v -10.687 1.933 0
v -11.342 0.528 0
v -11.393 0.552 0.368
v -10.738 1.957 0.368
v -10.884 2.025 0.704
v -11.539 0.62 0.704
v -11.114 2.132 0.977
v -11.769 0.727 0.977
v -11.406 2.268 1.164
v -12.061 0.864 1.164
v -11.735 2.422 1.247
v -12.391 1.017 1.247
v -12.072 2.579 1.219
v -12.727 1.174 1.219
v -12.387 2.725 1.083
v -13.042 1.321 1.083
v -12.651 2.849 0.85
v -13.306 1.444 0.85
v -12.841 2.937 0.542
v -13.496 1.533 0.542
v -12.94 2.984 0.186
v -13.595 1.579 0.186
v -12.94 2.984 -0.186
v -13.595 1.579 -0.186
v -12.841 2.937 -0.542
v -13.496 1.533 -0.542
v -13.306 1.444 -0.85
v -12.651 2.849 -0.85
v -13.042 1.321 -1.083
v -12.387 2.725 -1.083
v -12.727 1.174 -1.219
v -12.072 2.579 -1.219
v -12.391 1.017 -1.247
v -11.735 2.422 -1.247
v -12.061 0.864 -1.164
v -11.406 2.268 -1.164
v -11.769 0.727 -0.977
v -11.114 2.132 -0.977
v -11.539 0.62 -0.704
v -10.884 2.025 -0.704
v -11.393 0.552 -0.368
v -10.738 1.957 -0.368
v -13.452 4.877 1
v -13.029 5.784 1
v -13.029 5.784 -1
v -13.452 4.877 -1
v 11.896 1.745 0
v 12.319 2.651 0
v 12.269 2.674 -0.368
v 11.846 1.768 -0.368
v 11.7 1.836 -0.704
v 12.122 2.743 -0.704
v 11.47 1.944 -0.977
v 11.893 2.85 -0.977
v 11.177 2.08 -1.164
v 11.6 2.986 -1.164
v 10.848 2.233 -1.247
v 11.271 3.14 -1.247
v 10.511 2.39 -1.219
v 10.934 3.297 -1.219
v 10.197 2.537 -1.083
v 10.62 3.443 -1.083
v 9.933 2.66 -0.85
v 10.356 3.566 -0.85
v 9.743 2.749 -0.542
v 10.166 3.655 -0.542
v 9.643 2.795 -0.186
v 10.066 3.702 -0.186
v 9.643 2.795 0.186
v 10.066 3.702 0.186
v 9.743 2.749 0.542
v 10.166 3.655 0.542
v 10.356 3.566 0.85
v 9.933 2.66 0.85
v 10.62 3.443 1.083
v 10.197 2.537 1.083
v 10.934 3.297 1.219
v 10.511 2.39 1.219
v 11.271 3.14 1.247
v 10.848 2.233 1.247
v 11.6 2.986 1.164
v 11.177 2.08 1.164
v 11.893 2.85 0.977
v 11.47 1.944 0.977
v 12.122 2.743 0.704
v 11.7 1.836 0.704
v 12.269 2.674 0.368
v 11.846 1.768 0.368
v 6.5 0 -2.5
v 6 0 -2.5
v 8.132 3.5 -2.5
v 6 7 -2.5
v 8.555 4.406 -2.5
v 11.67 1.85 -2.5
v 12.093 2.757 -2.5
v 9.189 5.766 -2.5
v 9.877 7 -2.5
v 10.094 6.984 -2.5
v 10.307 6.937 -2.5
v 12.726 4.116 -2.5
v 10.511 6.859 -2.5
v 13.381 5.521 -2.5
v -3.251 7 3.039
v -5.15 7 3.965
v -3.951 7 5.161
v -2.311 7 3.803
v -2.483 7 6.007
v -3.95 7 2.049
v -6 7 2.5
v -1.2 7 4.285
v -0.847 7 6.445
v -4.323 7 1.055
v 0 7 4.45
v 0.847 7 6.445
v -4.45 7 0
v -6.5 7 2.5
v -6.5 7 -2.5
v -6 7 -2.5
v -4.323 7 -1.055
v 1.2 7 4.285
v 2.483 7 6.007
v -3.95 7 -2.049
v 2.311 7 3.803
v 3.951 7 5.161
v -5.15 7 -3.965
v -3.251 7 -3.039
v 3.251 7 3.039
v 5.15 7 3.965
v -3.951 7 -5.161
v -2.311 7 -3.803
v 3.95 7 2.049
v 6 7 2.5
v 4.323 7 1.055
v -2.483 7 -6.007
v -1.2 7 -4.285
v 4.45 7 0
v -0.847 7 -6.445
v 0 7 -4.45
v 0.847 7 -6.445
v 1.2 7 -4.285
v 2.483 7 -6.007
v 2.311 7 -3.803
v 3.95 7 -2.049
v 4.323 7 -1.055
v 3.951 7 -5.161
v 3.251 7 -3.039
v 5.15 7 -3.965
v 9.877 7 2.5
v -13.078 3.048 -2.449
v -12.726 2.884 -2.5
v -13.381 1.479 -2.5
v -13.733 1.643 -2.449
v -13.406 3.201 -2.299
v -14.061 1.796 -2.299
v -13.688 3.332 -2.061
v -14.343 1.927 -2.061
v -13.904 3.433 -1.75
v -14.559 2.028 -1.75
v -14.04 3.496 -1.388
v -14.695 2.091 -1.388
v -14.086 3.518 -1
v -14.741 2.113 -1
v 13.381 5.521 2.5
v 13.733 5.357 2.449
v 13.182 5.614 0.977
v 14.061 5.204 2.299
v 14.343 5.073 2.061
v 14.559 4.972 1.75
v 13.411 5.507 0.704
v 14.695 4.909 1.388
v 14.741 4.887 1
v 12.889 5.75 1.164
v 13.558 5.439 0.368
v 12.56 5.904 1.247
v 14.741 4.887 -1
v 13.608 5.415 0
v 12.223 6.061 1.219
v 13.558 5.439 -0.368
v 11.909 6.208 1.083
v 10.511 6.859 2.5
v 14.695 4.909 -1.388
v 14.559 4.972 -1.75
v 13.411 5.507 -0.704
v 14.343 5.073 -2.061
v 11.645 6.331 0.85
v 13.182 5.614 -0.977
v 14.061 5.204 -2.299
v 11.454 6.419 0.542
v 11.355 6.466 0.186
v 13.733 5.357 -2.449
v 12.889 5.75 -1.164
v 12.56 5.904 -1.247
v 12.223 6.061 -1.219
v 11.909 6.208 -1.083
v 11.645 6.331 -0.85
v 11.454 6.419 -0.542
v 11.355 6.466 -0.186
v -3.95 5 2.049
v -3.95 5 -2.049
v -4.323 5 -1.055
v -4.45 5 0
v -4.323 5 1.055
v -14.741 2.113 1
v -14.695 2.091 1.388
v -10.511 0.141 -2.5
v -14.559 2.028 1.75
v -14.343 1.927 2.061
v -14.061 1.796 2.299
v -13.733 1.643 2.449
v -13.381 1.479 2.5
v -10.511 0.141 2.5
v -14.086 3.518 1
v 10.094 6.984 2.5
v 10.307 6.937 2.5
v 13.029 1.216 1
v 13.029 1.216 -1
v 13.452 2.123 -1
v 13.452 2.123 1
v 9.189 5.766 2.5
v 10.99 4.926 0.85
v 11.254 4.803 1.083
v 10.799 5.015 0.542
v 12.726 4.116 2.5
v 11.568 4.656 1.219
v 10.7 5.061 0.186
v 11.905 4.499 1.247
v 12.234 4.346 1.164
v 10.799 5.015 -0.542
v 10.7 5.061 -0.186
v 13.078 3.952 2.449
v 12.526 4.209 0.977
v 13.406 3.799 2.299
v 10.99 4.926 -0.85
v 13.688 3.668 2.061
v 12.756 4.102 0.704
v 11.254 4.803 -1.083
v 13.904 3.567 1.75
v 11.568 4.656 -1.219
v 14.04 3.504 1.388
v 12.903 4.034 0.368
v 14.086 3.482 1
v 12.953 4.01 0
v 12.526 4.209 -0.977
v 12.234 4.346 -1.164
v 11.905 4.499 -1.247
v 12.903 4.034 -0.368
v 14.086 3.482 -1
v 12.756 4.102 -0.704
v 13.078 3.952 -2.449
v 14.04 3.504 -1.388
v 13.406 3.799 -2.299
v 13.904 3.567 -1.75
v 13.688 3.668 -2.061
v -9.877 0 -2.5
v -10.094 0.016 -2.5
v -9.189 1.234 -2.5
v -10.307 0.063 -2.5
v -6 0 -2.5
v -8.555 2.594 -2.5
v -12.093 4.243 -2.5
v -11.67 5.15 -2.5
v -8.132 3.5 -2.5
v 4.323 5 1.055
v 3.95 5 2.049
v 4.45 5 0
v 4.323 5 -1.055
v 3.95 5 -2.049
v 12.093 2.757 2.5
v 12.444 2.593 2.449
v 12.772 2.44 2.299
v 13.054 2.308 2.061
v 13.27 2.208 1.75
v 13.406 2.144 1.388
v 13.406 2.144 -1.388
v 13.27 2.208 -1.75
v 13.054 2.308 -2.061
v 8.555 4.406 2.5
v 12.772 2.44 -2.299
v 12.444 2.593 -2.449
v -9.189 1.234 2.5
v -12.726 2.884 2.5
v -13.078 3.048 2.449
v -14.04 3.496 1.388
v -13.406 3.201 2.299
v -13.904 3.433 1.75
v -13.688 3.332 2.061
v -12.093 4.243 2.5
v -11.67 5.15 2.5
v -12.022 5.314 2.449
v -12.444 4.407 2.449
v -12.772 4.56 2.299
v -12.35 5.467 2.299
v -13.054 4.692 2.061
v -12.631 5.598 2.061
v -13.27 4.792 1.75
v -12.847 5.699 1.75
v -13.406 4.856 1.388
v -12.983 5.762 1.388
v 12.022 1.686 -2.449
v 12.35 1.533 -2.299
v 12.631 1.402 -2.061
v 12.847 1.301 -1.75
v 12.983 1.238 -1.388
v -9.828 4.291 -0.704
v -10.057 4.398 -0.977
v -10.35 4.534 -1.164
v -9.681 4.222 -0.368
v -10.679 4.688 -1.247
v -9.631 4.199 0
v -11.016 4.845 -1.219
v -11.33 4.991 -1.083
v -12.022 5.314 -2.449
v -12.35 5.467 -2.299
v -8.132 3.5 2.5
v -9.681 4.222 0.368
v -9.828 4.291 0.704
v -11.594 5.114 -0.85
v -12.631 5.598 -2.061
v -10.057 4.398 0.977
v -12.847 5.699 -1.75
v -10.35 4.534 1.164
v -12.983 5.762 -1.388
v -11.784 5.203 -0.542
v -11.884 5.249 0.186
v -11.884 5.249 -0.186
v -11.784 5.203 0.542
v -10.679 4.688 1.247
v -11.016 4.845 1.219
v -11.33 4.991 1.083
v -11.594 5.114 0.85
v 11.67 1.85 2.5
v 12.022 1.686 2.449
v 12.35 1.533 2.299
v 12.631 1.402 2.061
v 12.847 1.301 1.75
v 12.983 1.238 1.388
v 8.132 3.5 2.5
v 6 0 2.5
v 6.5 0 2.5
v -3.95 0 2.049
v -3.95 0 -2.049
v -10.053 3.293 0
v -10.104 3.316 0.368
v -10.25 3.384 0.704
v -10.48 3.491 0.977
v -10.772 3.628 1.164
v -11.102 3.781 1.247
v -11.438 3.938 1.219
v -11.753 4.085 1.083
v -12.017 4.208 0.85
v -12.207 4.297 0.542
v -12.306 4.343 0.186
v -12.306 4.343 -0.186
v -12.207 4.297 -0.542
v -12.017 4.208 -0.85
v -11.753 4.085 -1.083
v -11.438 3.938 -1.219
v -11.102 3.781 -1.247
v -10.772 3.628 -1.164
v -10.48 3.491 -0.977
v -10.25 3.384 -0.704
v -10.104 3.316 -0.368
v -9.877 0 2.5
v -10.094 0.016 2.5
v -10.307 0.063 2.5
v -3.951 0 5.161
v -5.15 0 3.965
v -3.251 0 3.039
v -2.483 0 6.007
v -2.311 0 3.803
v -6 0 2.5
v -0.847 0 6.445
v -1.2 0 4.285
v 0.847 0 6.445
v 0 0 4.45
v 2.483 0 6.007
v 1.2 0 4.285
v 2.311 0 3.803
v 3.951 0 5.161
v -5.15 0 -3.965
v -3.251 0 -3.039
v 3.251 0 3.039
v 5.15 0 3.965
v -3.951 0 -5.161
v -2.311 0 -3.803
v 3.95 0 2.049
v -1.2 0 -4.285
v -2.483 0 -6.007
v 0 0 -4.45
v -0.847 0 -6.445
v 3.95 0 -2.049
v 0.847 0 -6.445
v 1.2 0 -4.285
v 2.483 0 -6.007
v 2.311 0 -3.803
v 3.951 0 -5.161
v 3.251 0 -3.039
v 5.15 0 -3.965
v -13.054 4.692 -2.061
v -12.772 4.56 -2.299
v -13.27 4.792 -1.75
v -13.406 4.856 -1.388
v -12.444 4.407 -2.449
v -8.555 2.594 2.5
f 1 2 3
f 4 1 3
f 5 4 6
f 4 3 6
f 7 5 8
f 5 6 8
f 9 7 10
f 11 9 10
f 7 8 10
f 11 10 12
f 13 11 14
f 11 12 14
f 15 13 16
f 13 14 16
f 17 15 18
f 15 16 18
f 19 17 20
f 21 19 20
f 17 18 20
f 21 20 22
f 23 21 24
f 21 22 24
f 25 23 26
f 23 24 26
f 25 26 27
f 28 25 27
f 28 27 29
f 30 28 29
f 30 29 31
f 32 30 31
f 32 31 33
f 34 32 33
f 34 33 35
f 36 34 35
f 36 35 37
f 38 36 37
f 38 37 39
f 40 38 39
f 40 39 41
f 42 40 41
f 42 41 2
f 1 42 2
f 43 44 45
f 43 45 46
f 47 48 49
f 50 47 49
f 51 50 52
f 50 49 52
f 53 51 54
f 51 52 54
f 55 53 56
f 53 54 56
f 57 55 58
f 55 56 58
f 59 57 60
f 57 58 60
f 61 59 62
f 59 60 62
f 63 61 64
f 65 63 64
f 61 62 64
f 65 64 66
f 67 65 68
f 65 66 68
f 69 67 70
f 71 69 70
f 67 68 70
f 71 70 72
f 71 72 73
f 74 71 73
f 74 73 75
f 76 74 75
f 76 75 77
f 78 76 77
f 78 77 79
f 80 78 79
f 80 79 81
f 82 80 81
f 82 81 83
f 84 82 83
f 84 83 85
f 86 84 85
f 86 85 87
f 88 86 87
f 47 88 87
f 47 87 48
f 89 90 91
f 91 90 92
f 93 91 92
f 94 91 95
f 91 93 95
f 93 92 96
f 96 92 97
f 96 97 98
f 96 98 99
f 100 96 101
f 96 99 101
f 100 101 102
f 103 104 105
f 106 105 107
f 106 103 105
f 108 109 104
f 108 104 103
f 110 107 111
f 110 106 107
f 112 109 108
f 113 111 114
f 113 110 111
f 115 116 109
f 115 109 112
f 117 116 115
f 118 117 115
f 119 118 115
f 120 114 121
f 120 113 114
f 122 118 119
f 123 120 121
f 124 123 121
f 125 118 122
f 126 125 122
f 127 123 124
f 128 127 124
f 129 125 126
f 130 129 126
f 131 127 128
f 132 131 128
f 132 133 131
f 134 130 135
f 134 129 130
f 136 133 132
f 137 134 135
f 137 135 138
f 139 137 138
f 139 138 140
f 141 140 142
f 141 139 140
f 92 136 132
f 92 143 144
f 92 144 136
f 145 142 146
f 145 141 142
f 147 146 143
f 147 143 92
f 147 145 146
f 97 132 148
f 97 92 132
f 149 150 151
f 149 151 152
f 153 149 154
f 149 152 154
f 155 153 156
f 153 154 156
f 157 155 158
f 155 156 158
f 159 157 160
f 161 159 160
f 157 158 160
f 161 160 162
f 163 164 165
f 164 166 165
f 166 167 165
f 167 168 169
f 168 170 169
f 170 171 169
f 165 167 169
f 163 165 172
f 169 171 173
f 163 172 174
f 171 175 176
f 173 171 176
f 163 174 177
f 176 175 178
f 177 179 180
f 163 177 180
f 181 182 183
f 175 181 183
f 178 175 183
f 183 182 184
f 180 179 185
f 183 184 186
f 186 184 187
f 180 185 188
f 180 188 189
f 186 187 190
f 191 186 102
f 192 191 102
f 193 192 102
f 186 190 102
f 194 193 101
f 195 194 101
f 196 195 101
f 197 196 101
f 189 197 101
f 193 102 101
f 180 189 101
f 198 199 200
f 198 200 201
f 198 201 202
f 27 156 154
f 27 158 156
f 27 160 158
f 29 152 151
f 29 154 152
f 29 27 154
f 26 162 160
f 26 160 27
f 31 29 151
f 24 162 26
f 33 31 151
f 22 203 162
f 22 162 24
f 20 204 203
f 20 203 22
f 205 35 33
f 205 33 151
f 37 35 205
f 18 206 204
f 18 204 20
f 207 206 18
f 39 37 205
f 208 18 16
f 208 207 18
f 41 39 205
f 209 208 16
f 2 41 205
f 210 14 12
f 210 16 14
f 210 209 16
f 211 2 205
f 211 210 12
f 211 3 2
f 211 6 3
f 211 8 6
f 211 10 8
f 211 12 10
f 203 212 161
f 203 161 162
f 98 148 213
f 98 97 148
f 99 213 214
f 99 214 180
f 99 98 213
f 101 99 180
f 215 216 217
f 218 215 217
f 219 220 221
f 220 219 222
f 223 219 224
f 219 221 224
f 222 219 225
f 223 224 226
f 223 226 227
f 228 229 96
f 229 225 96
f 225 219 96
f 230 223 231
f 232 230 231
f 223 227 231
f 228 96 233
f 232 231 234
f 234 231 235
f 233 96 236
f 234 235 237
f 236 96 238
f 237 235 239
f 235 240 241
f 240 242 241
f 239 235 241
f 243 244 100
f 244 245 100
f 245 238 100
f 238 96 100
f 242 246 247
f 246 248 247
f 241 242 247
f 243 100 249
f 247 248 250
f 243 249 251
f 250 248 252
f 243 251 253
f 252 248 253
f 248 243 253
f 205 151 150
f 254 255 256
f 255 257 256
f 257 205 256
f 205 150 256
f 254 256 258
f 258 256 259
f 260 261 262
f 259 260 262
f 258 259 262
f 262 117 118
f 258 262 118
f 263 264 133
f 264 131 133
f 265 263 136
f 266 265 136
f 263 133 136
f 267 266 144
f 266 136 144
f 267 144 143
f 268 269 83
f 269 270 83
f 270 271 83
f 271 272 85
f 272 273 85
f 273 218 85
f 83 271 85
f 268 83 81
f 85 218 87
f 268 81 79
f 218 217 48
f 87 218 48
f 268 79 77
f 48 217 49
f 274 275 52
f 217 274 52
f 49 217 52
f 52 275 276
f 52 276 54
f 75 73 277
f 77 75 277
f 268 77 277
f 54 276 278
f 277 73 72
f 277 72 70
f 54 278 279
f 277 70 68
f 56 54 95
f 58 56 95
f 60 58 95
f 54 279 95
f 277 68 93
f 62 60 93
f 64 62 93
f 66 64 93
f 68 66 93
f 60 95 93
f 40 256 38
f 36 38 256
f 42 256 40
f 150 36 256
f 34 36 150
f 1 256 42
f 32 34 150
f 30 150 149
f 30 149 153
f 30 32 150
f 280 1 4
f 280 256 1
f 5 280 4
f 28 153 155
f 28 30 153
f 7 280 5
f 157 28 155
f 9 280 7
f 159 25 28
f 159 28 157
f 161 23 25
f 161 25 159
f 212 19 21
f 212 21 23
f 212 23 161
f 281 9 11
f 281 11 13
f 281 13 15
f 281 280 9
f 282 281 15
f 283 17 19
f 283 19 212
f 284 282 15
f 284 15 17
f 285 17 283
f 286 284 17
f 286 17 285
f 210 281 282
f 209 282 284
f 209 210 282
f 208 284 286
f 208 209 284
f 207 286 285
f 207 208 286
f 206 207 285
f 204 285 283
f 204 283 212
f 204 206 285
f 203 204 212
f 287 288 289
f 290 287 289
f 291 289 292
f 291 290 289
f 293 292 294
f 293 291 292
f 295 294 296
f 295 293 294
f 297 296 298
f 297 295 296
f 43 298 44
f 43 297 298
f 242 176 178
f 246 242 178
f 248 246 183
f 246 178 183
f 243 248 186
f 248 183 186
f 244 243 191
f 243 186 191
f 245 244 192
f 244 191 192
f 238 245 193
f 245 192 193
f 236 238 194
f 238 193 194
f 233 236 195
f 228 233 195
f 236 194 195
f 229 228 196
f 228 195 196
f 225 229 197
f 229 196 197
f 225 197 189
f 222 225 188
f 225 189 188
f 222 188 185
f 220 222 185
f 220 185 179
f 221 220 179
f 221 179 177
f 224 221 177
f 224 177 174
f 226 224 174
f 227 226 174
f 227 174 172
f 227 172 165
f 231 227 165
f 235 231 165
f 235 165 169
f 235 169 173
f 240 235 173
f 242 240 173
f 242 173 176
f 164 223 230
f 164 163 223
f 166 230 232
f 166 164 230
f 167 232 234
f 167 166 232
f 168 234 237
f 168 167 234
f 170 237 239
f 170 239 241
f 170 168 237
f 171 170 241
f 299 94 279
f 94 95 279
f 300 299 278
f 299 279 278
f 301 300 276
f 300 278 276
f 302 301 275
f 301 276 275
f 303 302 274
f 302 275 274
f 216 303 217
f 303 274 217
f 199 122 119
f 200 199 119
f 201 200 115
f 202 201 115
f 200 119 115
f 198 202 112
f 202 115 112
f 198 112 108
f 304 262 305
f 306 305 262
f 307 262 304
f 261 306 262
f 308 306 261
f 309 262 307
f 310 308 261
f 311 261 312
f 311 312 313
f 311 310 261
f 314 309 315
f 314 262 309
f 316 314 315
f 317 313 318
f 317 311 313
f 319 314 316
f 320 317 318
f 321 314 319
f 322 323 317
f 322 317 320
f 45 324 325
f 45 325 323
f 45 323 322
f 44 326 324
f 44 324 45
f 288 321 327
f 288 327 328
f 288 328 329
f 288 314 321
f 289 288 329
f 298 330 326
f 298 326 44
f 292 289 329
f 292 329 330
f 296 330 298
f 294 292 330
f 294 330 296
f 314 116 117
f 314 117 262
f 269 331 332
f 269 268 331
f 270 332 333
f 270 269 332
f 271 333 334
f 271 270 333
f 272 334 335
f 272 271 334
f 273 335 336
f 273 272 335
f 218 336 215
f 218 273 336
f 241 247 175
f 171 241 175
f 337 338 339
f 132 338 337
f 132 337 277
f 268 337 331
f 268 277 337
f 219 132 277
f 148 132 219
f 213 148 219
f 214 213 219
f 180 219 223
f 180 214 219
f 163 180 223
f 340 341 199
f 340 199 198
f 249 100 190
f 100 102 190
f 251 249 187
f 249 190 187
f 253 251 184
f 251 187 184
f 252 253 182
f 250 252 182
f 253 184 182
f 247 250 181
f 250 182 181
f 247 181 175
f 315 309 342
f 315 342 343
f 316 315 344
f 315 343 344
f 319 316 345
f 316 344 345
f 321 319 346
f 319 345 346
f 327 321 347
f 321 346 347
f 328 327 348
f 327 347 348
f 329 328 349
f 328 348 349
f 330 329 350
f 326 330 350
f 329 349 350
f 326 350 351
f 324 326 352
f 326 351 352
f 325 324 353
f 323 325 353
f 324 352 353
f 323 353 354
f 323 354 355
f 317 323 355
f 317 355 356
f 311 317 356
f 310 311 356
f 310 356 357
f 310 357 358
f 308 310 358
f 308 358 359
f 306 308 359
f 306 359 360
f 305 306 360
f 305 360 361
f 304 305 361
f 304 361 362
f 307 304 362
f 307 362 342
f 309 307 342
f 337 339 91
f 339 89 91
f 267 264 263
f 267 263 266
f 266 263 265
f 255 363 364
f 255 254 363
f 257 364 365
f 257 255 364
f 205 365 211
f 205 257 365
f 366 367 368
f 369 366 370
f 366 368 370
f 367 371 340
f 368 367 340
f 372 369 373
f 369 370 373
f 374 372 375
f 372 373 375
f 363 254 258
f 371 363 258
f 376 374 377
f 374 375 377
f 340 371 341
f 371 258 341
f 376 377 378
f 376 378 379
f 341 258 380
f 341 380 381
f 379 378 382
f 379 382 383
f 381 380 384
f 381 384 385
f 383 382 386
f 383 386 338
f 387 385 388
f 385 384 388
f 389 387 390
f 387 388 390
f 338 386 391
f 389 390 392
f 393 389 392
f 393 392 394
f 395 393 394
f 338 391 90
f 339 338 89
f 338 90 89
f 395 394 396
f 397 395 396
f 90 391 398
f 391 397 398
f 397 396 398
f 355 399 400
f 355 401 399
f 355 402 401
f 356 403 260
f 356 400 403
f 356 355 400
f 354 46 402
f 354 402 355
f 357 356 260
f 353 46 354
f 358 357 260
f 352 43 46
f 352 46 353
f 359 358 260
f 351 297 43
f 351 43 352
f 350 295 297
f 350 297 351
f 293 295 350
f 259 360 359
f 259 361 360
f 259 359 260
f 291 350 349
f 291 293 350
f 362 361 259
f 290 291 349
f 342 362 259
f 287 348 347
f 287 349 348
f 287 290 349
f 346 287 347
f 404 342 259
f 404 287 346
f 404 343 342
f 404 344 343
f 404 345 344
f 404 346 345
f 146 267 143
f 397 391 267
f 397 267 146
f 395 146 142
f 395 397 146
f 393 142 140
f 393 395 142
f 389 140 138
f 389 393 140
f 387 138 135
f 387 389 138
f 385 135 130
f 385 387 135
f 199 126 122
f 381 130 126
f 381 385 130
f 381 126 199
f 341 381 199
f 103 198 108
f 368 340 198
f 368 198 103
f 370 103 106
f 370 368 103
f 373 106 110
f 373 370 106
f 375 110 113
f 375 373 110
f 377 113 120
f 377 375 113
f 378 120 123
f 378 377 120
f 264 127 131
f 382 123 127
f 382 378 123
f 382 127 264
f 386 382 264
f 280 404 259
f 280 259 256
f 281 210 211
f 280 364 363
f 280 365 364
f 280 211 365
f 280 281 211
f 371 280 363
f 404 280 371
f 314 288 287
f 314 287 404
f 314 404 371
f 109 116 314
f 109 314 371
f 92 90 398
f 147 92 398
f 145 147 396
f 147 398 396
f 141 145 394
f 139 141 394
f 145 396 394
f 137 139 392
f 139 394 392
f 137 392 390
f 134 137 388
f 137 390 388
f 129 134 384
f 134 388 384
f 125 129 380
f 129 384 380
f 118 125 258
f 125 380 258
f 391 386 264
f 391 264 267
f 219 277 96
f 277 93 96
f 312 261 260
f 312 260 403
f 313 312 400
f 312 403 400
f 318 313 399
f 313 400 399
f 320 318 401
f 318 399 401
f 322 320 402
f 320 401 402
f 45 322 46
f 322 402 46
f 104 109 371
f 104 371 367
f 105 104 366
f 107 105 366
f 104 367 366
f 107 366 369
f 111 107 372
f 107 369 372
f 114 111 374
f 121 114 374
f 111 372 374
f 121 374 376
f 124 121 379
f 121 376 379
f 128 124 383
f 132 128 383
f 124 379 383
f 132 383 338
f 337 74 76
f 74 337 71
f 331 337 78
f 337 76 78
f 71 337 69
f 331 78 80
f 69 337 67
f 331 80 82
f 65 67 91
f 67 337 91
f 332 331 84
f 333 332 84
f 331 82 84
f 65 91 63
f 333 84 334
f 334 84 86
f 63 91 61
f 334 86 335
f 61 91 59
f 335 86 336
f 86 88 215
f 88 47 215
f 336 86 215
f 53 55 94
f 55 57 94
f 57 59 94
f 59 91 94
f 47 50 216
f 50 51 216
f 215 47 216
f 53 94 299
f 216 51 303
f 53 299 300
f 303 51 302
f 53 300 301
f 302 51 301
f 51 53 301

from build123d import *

# Parameters (mm, degrees)
SKETCH1_R           = 6.5
BOSS_EXTRUDE1_DEPTH = 7
BOSS_EXTRUDE2_DEPTH = 2.5
SKETCH3_R           = 1.25
CUT_EXTRUDE1_DEPTH  = 17.888639434
SKETCH4_R           = 1.25
CUT_EXTRUDE2_DEPTH  = 17.888639434
FILLET1_R           = 1.5
SKETCH5_R           = 4.45
CUT_EXTRUDE3_DEPTH  = 2


with BuildPart() as part:
    # Sketch1 → Boss-Extrude1 (new body)
    with BuildSketch(Plane(origin=(0, 0, 0), x_dir=(1, 0, 0), z_dir=(0, 1, 0))):
        Circle(SKETCH1_R)
        with BuildLine():
            Line((-3.95, 2.049390153), (-3.95, -2.049390153))
            ThreePointArc((-3.95, -2.049390153), (0, -4.45), (3.95, -2.049390153))
            Line((3.95, -2.049390153), (3.95, 2.049390153))
            ThreePointArc((3.95, 2.049390153), (0, 4.45), (-3.95, 2.049390153))
        make_face(mode=Mode.SUBTRACT)
    extrude(amount=BOSS_EXTRUDE1_DEPTH)

    # Sketch2 → Boss-Extrude2 (add, symmetric)
    with BuildSketch(Plane.XY):
        Polygon((5.5, 7), (5.5, 0), (6.5, 0), (8.132076804, 3.5), (13.029353969, 1.216362154), (13.45197223, 2.122669941), (8.554695065, 4.406307787), (9.188622458, 5.765769468), (14.085899623, 3.482131621), (14.740957929, 4.886908691), (10.209418994, 7), align=None)
        Polygon((-5.5, 0), (-5.5, 7), (-6.5, 7), (-8.132076804, 3.5), (-13.029353969, 5.783637846), (-13.45197223, 4.877330059), (-8.554695065, 2.593692213), (-9.188622458, 1.234230532), (-14.085899623, 3.517868379), (-14.740957929, 2.113091309), (-10.209418994, 0), align=None)
    extrude(amount=BOSS_EXTRUDE2_DEPTH, both=True)

    # Sketch3 → Cut-Extrude1 (cut, through all)
    with BuildSketch(Plane(origin=(4.504621032, 9.660190978, 0), x_dir=(0.906307787, -0.422618262, 0), z_dir=(0.422618262, 0.906307787, 0))):
        with Locations((8.794548103, 0)):
            Circle(SKETCH3_R)
    extrude(amount=-CUT_EXTRUDE1_DEPTH, mode=Mode.SUBTRACT)

    # Sketch4 → Cut-Extrude2 (cut, through all)
    with BuildSketch(Plane(origin=(-1.823465481, -3.910434344, 0), x_dir=(0.906307787, -0.422618262, 0), z_dir=(-0.422618262, -0.906307787, 0))):
        with Locations((-11.752875935, 0)):
            Circle(SKETCH4_R)
    extrude(amount=-CUT_EXTRUDE2_DEPTH, mode=Mode.SUBTRACT)

    # Fillet1
    fillet1_edges = [part.edges().sort_by_distance(p)[0] for p in [
        (13.2406631, 1.669516047, 2.5),
        (14.413428776, 4.184520156, 2.5),
        (10.209418994, 7, 0),
        (13.2406631, 1.669516047, -2.5),
        (14.413428776, 4.184520156, -2.5),
        (-13.2406631, 5.330483953, 2.5),
        (-14.413428776, 2.815479844, 2.5),
        (-14.413428776, 2.815479844, -2.5),
        (-10.209418994, 0, 0),
        (-13.2406631, 5.330483953, -2.5),
    ]]
    fillet(fillet1_edges, radius=FILLET1_R)

    # Sketch5 → Cut-Extrude3 (cut)
    with BuildSketch(Plane(origin=(0, 7, 0), x_dir=(1, 0, 0), z_dir=(0, 1, 0))):
        Circle(SKETCH5_R)
    extrude(amount=-CUT_EXTRUDE3_DEPTH, mode=Mode.SUBTRACT)


solid = part.part
